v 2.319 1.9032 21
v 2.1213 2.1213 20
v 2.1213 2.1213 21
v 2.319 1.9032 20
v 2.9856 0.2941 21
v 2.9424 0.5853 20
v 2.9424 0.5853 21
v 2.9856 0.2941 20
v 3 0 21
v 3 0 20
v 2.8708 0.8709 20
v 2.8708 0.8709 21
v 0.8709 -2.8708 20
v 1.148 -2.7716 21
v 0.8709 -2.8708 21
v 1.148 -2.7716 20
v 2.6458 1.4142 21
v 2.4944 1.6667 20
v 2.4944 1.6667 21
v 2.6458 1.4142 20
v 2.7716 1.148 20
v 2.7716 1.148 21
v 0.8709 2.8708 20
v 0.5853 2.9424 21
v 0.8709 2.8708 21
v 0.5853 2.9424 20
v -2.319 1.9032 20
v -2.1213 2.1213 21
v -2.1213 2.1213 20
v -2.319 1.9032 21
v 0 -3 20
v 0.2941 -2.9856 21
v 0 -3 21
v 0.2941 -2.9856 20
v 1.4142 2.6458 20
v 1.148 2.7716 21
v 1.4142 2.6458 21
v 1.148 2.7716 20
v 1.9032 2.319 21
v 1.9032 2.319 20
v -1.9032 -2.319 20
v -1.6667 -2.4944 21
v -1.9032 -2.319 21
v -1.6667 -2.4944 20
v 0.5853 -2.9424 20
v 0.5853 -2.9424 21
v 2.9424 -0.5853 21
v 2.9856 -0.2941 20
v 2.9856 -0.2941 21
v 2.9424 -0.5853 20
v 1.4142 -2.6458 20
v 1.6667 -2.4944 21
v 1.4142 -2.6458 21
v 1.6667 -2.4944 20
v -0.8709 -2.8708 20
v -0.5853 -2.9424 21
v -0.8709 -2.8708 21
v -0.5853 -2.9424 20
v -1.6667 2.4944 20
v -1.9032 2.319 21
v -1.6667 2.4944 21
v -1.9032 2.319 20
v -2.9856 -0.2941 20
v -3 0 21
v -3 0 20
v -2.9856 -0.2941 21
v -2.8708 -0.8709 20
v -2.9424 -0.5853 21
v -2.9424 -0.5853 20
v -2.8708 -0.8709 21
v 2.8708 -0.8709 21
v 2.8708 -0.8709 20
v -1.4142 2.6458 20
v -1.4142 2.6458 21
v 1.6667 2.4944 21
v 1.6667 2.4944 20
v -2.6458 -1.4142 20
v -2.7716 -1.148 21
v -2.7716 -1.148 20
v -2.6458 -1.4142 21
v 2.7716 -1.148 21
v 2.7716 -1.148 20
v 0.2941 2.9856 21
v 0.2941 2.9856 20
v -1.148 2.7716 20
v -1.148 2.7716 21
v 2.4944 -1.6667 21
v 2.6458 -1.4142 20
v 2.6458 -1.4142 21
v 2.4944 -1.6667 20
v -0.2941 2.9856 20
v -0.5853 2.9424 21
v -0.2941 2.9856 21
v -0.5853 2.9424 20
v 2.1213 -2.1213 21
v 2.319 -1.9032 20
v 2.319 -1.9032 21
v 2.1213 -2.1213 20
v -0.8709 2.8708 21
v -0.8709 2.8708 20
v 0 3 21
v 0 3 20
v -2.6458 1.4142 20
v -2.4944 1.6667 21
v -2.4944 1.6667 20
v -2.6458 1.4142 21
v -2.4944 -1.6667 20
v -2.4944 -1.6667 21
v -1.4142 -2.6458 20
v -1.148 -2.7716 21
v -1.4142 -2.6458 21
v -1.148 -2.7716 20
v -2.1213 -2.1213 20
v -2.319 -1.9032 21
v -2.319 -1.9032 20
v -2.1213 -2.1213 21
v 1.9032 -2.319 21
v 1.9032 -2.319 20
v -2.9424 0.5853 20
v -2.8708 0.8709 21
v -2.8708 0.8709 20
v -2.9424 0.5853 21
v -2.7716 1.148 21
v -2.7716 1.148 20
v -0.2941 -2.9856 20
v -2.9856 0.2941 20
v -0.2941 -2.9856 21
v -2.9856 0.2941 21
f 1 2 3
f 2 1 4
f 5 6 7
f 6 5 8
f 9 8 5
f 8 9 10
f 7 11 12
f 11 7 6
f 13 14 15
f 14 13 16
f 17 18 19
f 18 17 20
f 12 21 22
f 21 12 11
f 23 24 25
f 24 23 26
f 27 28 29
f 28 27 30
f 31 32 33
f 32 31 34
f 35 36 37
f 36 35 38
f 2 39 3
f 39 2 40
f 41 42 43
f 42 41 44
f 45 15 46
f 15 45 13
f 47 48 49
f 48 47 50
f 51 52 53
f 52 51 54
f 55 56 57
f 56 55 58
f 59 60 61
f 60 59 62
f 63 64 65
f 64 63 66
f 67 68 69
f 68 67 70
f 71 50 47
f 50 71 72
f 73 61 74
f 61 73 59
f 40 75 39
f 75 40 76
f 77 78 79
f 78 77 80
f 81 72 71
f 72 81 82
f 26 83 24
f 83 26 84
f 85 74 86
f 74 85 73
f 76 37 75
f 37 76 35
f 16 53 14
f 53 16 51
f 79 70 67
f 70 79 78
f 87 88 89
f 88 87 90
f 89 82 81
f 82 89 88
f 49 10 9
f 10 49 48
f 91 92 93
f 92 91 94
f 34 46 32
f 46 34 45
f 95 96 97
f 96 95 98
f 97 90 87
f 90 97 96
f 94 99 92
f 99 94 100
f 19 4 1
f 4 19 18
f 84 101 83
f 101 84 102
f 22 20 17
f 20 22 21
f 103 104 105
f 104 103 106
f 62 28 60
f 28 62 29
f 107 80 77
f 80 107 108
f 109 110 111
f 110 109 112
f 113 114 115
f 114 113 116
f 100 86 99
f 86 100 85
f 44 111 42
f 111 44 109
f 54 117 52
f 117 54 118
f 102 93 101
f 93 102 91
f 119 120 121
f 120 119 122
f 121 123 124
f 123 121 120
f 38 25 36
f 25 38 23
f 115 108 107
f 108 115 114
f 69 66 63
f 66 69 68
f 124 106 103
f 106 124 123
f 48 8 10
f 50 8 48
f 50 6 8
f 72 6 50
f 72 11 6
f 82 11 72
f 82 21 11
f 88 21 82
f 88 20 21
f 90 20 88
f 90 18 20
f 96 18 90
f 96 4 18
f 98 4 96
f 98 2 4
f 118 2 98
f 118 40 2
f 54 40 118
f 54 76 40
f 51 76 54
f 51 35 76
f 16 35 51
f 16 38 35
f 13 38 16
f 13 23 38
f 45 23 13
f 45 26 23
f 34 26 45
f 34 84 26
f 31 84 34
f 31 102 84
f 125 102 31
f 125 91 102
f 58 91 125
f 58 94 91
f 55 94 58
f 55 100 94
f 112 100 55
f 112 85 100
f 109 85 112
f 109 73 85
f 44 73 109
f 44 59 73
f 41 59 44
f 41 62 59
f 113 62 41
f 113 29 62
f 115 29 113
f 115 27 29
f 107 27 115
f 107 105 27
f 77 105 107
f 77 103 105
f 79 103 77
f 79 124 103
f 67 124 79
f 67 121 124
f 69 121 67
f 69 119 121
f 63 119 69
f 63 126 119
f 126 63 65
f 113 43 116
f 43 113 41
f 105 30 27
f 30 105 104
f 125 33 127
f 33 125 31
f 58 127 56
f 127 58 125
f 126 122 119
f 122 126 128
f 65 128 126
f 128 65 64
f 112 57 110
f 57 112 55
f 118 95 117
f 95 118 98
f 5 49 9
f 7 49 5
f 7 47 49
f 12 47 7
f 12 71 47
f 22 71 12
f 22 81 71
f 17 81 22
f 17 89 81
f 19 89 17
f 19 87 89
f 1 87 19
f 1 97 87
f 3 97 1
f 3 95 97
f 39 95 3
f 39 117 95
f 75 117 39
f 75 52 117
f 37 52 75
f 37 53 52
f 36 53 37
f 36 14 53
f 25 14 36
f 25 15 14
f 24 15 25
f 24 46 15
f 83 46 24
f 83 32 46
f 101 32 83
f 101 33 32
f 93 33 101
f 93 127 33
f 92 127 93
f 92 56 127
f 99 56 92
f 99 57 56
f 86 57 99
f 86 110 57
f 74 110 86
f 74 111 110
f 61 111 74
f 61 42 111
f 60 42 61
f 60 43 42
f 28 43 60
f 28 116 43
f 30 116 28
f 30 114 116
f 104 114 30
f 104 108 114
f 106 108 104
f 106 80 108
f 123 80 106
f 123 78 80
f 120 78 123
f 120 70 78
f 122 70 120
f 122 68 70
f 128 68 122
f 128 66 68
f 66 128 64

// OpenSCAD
// Hose-barb reducer: 8 mm OD barb -> 5 mm OD barb
// Print orientation: standing upright along Z

$fn = 64;

// ---- Dimensions (mm) ----
barb_od        = 8;    // inner tubing outer diameter
tip_od         = 5;    // tip tubing outer diameter
bore           = 3;    // through-bore diameter
barb_length    = 20;   // barb length (z = 0 to 20)
collar_height  = 5;    // collar height (z = 20 to 25)
lower_barb_len = 8;    // lower barb length (z = 25 to 33)
upper_barb_len = 8;    // upper barb length (z = 33 to 41)
overlap        = 0.5;  // overlap for clean booleans

// ---- Model ----
difference() {
    union() {
        // Lower barb: sawtooth profile, rotated onto Z
        translate([0, 0, 0])
            rotate([90, 0, 0])
                linear_extrude(height = barb_length + overlap)
                    polygon([
                        [0, 0],
                        [lower_barb_len + overlap, lower_barb_len + overlap],
                        [lower_barb_len + overlap, 0],
                        [0, lower_barb_len]
                    ]);

        // Collar
        translate([0, 0, barb_length])
            cylinder(height = collar_height, d = tip_od + 2 * overlap);

        // Upper barb: sawtooth profile, rotated onto Z
        translate([0, 0, barb_length + collar_height])
            rotate([90, 0, 0])
                linear_extrude(height = upper_barb_len + overlap)
                    polygon([
                        [0, 0],
                        [upper_barb_len + overlap, upper_barb_len + overlap],
                        [upper_barb_len + overlap, 0],
                        [0, upper_barb_len]
                    ]);
    }

    // Through-bore
    translate([0, 0, -overlap])
        cylinder(height = barb_length + collar_height + 2 * overlap, d = bore);
}
